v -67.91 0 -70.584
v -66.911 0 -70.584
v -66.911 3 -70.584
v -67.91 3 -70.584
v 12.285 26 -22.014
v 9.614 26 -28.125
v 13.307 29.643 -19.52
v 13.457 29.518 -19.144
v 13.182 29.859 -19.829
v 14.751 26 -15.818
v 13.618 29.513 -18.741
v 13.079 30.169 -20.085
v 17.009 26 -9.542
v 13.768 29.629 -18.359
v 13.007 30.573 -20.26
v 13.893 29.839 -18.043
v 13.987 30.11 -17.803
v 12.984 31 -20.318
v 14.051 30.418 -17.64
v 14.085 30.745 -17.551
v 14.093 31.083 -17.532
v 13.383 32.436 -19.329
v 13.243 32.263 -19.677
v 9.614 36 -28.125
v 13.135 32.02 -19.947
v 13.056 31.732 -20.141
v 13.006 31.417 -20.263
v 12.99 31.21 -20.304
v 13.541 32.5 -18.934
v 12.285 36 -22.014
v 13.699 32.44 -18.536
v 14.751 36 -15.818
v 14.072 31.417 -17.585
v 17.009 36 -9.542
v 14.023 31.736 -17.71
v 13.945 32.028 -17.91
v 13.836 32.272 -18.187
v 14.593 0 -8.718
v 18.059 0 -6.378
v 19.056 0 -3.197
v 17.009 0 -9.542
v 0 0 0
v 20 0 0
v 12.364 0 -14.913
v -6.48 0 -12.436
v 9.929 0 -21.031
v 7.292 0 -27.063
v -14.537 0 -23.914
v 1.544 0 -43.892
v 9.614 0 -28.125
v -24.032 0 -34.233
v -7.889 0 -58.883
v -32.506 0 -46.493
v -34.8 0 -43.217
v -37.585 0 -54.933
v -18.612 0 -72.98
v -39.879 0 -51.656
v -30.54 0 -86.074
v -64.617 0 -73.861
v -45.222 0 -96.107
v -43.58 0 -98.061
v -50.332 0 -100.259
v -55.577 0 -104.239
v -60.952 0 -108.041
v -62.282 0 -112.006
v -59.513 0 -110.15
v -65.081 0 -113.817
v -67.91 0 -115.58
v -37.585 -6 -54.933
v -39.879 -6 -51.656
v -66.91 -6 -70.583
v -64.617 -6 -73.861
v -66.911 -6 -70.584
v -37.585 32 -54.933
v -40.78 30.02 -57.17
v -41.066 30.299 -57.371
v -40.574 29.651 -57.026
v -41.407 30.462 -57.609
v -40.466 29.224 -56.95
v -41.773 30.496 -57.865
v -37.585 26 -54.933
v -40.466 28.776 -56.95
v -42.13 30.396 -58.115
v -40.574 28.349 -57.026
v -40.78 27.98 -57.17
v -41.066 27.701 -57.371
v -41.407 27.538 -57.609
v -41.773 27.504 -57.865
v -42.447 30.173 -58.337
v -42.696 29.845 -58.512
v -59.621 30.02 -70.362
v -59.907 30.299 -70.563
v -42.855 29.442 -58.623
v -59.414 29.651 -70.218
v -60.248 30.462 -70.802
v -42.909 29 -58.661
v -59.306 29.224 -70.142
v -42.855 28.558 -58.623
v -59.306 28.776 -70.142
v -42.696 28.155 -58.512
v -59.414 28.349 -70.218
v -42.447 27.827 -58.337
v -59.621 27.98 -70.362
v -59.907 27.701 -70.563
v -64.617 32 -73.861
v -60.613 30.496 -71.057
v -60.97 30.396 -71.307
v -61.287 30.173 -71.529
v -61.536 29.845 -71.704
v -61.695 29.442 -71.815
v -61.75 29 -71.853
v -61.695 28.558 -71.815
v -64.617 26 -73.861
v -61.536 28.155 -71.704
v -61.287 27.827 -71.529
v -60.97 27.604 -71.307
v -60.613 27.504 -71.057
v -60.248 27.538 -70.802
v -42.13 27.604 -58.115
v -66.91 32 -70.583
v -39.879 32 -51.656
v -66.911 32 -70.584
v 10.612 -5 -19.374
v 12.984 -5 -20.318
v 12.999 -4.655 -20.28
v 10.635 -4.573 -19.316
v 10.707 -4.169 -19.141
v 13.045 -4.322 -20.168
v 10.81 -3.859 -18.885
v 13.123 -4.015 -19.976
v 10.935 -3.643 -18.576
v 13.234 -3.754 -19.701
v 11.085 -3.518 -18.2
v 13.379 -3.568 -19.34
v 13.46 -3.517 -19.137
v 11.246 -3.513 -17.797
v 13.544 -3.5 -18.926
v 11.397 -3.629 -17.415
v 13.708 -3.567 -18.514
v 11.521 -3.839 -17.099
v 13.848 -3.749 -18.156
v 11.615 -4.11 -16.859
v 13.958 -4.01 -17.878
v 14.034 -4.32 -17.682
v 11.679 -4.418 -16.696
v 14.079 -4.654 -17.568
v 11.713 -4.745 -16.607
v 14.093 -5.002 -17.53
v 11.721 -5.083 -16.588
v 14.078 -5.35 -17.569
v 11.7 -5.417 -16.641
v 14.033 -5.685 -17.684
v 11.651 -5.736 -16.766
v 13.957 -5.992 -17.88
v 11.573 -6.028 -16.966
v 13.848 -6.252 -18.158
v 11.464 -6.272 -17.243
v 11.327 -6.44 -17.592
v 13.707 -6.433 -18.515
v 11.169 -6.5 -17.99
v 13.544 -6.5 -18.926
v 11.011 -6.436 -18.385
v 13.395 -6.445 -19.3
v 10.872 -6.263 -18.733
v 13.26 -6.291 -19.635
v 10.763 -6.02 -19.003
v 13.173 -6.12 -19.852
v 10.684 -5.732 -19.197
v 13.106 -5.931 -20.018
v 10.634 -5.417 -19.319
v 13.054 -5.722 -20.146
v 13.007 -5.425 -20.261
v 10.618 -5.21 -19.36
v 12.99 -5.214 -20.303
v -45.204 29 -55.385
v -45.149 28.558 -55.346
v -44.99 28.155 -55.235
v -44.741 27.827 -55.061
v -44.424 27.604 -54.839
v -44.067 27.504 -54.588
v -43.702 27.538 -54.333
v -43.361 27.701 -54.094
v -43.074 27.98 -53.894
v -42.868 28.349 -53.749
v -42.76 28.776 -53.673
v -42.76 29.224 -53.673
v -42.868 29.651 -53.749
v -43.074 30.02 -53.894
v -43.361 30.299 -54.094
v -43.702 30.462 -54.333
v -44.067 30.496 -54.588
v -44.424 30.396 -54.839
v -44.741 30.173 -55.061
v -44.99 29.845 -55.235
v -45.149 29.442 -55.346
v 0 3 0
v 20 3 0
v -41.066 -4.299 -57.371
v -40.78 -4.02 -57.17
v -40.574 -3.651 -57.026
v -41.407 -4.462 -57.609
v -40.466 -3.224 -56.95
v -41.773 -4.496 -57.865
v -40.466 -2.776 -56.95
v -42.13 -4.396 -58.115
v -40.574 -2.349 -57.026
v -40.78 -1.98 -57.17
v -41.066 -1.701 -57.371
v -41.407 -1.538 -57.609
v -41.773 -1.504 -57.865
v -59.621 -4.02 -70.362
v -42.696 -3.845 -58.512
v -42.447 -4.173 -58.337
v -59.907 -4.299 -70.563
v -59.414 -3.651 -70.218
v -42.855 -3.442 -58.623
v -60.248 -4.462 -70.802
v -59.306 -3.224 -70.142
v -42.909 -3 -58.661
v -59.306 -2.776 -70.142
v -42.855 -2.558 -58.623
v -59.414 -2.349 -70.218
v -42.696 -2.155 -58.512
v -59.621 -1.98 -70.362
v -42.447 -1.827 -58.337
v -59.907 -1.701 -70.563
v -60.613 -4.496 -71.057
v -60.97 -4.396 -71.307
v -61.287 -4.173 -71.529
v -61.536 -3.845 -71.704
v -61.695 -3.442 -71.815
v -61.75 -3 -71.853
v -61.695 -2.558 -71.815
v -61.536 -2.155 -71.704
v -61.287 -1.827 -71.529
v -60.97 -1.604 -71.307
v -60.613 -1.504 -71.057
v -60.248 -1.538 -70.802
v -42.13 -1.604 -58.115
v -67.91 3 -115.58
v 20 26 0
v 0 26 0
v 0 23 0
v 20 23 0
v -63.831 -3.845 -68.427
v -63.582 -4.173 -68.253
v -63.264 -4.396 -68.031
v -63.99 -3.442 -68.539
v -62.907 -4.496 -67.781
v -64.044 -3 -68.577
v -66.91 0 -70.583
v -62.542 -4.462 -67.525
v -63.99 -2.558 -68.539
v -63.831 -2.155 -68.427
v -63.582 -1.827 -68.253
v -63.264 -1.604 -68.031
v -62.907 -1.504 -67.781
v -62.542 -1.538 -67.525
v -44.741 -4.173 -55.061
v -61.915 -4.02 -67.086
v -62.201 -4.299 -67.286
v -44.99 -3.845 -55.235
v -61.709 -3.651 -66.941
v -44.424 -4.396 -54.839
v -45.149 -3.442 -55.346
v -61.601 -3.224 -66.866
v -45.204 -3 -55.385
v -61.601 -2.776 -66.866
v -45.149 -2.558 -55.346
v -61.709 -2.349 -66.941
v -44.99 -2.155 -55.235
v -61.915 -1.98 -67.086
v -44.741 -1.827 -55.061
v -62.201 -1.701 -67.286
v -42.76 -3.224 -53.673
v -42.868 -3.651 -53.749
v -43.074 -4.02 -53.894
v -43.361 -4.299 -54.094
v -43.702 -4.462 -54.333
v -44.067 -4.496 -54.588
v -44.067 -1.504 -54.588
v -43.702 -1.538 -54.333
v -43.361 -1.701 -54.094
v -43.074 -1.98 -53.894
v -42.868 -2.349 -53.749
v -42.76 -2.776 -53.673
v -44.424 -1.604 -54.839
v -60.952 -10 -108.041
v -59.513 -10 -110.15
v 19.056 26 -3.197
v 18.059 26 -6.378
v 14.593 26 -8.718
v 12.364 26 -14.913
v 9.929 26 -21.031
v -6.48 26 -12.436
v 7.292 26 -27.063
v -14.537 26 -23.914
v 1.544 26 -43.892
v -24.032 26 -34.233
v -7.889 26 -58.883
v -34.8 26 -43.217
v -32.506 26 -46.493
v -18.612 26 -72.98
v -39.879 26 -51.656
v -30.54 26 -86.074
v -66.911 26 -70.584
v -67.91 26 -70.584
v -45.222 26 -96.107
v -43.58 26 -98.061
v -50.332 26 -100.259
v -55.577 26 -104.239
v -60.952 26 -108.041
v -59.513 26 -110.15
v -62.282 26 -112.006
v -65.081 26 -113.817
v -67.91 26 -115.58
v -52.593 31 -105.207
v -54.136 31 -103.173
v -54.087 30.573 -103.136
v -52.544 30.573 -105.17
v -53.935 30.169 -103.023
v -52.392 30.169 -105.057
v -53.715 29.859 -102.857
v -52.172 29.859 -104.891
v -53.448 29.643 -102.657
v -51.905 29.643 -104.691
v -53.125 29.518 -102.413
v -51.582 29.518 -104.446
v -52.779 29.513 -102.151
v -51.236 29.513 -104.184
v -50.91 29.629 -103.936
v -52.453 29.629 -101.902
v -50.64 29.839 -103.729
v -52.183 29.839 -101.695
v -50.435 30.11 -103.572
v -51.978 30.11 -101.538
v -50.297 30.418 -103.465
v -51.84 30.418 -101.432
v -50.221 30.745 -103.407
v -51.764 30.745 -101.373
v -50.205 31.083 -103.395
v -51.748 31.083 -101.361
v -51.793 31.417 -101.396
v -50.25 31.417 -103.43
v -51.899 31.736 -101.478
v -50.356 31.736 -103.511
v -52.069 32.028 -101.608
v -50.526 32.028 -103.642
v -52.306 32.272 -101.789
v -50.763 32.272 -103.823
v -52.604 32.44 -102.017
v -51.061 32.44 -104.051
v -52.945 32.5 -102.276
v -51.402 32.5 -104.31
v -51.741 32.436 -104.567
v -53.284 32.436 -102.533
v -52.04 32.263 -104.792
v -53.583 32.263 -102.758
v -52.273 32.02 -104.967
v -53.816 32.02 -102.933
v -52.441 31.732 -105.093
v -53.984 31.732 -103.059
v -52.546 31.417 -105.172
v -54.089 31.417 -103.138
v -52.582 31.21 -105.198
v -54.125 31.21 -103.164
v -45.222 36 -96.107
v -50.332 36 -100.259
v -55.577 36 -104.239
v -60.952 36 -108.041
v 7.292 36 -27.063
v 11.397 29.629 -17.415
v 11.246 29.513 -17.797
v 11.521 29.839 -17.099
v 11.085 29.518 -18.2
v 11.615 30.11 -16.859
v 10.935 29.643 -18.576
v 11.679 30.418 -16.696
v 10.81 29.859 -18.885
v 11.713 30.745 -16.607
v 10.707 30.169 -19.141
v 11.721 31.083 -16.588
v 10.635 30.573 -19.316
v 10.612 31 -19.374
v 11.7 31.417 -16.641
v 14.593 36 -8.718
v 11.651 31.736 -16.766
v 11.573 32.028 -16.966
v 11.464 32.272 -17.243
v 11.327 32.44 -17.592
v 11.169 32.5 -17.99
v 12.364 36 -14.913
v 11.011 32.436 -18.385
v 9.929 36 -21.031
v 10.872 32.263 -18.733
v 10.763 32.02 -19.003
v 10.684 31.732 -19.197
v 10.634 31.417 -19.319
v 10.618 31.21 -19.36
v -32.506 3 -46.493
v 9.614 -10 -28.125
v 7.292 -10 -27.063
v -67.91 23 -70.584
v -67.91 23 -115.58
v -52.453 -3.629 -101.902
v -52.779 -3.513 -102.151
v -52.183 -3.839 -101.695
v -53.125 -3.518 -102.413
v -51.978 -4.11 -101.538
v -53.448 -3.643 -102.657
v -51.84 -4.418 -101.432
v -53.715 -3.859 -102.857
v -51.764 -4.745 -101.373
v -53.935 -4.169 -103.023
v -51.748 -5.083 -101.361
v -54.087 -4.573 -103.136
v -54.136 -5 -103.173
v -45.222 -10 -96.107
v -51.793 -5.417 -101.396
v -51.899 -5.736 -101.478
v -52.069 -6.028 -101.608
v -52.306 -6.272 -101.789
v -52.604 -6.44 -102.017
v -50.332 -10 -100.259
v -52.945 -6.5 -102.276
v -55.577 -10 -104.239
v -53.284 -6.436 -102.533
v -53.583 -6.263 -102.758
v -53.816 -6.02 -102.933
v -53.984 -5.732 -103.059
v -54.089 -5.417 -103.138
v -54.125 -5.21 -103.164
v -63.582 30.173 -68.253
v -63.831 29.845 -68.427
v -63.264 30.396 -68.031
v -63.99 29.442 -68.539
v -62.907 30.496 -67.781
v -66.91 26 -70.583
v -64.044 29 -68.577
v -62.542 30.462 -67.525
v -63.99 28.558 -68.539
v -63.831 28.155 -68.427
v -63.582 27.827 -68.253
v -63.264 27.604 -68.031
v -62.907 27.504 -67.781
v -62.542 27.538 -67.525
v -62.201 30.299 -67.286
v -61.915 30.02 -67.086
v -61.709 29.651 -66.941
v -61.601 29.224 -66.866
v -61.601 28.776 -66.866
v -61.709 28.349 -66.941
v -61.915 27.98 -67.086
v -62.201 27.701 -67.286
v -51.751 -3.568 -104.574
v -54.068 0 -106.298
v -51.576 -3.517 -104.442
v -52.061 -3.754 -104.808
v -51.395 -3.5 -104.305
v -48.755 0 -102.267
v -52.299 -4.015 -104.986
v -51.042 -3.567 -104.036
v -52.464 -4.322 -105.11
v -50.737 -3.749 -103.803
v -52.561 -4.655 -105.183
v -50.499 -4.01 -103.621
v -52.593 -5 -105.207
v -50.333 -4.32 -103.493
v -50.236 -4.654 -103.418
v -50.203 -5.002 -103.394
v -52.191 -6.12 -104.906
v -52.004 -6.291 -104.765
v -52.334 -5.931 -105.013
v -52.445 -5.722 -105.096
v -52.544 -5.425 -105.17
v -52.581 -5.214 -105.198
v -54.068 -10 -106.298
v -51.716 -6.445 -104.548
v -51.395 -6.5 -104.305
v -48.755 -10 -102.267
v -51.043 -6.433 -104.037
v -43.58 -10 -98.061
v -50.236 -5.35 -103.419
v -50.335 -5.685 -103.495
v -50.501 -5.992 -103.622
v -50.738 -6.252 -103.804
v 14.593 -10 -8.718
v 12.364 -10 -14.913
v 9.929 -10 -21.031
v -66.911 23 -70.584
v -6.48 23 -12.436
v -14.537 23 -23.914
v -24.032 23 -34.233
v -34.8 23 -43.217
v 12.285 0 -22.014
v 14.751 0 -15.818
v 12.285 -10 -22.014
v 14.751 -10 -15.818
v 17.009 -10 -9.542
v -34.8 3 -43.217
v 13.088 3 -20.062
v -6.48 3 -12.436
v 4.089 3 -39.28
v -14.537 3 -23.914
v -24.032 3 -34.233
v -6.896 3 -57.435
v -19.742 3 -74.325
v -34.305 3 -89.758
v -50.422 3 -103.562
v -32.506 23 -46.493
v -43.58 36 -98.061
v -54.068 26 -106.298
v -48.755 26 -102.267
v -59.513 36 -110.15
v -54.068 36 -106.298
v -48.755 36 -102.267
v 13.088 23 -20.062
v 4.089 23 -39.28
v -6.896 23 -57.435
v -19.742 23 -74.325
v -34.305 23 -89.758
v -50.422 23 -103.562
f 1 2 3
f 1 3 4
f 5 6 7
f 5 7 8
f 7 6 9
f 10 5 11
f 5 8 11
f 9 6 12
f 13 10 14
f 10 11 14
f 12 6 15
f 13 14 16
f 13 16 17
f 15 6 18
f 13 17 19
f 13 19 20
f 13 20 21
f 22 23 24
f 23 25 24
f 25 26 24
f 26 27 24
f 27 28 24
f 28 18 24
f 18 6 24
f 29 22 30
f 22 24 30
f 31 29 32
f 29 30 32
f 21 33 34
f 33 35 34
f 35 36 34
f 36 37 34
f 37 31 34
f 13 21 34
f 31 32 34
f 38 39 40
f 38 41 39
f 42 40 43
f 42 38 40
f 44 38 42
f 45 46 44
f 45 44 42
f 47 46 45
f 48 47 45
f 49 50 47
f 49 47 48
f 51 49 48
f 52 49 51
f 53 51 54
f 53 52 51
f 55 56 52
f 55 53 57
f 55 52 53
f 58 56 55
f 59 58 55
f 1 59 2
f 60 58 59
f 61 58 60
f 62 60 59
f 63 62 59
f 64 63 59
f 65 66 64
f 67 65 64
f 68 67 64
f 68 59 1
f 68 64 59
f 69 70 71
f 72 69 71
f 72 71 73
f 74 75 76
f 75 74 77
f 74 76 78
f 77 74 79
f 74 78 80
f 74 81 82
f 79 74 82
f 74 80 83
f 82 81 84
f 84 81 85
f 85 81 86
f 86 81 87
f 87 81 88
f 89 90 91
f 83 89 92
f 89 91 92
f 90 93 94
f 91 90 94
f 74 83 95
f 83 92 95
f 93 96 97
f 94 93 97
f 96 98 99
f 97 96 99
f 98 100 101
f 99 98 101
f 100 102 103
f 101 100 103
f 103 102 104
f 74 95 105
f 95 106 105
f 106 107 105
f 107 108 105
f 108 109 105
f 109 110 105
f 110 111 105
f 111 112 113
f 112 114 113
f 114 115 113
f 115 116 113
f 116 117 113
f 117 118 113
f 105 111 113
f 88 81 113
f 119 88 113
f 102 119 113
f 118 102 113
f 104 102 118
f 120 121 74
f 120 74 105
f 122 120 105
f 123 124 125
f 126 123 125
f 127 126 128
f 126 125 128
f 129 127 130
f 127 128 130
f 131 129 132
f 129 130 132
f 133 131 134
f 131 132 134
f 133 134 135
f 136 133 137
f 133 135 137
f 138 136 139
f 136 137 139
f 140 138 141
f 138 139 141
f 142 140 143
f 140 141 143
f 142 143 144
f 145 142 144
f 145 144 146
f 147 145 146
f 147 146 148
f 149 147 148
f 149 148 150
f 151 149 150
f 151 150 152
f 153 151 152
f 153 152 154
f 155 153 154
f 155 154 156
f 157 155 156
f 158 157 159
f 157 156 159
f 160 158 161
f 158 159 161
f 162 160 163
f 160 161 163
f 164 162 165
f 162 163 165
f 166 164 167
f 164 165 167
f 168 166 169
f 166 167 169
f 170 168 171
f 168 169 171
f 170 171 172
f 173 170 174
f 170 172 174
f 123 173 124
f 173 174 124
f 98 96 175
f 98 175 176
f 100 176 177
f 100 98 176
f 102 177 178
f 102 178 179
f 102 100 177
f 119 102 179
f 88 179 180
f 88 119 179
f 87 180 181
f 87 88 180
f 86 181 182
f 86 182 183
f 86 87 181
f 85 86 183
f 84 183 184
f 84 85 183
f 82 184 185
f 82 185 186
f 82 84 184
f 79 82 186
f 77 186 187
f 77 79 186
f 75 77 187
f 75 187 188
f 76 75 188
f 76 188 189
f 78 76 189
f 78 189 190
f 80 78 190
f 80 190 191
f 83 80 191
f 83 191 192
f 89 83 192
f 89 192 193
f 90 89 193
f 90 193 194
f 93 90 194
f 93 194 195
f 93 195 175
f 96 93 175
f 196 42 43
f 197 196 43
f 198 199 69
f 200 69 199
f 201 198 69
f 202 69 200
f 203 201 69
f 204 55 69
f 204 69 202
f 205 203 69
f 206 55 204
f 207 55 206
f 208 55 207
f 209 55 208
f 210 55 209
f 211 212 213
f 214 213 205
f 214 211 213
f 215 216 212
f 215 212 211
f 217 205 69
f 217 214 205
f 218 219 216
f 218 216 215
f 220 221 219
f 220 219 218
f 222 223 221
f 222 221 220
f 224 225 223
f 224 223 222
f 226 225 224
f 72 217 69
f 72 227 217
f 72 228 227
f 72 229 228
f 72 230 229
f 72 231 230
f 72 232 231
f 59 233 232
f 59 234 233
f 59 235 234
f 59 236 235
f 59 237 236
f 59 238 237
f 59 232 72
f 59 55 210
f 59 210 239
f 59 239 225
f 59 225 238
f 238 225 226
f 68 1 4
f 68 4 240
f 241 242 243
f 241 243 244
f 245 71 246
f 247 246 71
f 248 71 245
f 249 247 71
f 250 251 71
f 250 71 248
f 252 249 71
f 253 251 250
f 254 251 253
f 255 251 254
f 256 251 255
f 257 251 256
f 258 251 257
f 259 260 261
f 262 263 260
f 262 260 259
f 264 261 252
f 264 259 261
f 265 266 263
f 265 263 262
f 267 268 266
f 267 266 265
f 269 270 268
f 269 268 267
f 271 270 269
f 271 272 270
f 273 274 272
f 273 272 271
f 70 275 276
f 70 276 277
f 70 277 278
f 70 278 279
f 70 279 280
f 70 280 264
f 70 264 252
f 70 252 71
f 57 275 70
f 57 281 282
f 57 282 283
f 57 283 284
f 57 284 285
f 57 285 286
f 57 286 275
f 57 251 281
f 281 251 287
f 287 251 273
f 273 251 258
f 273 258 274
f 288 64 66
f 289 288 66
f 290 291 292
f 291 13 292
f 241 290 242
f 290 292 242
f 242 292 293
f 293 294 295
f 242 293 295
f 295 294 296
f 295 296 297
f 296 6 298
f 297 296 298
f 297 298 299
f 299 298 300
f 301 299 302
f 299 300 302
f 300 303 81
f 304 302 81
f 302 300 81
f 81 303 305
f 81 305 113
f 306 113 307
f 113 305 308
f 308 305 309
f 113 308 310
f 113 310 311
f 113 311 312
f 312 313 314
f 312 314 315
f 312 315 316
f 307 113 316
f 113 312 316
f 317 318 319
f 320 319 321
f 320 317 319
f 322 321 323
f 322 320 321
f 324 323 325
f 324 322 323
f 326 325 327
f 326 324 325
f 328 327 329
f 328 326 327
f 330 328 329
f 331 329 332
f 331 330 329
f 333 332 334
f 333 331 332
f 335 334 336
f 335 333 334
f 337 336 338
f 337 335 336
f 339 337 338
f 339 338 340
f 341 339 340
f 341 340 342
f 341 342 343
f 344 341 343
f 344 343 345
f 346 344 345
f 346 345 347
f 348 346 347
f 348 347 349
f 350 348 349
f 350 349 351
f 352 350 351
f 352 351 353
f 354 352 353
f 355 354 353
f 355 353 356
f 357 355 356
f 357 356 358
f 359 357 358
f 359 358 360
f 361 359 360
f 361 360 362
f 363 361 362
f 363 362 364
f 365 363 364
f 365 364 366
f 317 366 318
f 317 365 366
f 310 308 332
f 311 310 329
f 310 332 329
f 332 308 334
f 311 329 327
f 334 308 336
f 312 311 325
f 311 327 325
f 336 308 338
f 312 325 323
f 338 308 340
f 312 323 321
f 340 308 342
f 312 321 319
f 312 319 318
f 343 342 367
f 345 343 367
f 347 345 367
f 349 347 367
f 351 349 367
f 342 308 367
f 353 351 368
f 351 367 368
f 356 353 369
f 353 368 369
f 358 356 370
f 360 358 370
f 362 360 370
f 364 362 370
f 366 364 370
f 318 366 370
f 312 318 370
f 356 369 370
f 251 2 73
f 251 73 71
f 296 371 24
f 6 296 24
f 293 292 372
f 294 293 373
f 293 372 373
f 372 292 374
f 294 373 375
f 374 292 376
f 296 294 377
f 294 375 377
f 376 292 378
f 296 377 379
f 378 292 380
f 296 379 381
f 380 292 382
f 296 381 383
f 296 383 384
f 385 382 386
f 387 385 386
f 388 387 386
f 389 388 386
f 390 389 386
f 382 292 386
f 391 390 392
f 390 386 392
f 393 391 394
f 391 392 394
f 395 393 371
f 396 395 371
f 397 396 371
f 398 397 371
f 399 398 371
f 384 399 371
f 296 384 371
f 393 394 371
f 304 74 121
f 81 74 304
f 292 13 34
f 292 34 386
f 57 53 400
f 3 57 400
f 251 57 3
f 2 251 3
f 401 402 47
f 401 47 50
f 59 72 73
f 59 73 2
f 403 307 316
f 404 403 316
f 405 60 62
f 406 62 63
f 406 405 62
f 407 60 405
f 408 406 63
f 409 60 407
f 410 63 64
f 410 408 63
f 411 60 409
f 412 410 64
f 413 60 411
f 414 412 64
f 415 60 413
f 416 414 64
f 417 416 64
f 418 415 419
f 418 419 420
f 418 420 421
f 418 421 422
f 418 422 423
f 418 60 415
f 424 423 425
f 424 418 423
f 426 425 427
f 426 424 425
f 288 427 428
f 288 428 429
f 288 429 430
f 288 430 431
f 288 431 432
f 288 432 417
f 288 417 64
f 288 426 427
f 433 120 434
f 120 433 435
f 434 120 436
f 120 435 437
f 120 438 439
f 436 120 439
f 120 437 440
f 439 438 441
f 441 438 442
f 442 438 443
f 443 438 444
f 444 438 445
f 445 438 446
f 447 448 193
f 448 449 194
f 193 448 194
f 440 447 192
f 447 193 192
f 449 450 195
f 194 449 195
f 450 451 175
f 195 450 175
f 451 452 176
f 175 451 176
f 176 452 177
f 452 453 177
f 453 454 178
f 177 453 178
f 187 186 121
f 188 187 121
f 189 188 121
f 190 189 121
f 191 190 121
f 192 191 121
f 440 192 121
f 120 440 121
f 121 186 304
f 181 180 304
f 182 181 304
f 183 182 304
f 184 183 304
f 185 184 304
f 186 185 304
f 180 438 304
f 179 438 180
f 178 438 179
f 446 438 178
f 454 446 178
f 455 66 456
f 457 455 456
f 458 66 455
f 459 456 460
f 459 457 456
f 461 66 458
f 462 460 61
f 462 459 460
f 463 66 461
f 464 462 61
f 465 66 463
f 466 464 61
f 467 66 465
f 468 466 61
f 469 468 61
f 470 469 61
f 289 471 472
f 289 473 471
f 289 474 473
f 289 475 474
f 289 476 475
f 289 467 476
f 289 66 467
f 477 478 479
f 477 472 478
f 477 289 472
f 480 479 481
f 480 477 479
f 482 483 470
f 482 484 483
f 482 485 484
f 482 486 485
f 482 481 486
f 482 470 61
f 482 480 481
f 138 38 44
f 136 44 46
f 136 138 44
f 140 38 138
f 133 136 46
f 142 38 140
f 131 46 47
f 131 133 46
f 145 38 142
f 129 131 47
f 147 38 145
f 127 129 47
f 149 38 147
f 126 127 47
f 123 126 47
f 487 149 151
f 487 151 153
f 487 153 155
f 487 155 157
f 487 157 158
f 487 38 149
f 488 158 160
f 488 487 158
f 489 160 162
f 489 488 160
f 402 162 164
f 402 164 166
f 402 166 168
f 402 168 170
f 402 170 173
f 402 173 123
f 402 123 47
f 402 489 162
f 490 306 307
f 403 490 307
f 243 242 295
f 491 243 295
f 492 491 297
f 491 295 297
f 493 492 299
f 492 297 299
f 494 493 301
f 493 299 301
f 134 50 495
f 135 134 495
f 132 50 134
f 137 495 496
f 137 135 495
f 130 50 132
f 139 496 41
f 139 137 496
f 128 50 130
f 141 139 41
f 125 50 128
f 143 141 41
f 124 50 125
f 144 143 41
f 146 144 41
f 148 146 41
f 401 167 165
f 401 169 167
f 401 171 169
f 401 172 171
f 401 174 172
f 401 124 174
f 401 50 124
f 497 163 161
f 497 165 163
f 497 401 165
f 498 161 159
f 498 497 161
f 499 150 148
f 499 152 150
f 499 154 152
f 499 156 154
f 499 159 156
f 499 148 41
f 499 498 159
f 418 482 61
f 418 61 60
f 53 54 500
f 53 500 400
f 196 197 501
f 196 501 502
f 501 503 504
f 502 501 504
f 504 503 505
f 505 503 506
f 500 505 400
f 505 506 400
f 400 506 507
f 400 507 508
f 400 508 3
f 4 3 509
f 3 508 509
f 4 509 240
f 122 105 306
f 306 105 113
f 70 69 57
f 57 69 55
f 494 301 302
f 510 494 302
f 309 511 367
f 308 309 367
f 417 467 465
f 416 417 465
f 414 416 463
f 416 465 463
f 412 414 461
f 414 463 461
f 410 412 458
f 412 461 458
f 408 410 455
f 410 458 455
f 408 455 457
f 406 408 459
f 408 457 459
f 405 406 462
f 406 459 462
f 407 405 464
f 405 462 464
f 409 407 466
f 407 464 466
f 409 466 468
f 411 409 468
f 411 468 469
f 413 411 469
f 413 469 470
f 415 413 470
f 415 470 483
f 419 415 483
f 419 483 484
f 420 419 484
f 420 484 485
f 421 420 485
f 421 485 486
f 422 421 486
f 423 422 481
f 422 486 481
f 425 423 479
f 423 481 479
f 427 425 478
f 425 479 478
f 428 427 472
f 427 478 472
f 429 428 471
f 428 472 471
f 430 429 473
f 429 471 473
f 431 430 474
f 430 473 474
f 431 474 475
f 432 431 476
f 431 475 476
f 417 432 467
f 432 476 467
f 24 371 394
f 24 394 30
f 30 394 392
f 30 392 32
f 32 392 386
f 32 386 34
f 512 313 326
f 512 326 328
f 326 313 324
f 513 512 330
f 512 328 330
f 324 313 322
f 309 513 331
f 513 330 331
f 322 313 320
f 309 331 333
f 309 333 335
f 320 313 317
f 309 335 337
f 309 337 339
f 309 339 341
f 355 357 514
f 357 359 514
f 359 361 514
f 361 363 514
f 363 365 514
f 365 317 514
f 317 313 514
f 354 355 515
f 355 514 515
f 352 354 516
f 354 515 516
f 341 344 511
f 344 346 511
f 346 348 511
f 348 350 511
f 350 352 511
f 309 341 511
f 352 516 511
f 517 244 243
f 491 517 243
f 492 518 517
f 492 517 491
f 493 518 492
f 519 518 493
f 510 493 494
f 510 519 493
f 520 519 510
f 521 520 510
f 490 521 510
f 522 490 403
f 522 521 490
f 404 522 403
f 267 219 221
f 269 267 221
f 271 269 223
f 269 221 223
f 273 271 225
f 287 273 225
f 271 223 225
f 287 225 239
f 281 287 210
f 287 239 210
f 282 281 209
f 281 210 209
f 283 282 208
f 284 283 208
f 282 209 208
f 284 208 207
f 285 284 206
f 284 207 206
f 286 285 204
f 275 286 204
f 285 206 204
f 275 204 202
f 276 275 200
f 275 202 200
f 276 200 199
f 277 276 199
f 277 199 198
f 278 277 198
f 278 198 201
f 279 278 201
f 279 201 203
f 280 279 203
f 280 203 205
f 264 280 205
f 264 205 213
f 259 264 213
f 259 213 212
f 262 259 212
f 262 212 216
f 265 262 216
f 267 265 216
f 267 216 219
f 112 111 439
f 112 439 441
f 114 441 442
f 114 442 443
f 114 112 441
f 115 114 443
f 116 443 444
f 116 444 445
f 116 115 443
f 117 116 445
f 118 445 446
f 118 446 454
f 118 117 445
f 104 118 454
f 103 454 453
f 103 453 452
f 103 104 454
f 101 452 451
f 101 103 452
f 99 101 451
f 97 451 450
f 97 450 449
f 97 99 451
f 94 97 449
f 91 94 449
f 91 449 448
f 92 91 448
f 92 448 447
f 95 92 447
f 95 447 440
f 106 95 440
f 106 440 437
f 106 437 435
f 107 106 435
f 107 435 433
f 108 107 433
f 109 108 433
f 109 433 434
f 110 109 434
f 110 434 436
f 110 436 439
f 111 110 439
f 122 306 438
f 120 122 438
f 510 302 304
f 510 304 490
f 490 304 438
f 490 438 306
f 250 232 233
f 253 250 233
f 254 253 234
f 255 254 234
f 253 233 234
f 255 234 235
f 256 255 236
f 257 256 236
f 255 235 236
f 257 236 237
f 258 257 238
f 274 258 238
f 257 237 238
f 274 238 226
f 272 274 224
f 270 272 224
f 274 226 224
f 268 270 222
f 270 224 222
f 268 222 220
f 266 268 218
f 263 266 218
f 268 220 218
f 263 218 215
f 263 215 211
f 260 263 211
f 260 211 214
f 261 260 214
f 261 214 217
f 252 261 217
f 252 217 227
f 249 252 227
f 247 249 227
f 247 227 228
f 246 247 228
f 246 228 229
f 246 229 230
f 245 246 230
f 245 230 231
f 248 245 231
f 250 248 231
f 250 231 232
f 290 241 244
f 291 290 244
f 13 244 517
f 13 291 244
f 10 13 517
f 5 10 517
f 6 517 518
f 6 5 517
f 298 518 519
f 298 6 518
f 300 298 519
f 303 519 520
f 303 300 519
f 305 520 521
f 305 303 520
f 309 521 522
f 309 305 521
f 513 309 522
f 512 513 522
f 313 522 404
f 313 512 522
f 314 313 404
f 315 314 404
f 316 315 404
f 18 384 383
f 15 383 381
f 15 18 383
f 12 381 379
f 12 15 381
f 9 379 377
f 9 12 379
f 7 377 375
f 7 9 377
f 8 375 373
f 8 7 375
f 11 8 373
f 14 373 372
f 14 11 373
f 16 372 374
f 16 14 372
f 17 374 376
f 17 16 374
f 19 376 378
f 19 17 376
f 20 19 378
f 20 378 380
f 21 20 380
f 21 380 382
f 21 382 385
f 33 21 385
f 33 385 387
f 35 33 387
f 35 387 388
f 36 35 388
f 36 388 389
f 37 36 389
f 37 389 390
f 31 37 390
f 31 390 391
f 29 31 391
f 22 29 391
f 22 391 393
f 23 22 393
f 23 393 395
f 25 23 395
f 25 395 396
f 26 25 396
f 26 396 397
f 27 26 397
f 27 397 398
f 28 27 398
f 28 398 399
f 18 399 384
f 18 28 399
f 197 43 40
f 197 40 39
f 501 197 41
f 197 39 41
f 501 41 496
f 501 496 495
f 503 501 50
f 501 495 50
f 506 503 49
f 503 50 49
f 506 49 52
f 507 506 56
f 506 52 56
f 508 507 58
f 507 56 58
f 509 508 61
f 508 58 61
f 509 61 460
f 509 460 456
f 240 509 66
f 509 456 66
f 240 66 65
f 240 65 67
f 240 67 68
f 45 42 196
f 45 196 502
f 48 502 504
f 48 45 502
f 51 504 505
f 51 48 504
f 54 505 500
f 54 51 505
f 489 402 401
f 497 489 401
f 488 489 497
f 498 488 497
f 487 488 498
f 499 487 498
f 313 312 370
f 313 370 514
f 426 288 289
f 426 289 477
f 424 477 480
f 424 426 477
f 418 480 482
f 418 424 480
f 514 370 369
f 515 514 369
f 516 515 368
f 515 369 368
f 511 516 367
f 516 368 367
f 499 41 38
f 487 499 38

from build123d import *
from build123d.topology import SkipClean

# Parameters (mm, degrees)
BOSS_EXTRUDE1_DEPTH = 3
BOSS_EXTRUDE2_DEPTH = 6
SKETCH3_R           = 1.5
SKETCH3_W           = 9.001604742
SKETCH3_H           = 6
SKETCH3_W_2         = 4.02
CUT_EXTRUDE1_DEPTH  = 127.267442601
BOSS_EXTRUDE3_DEPTH = 3
BOSS_EXTRUDE4_START = 10
BOSS_EXTRUDE4_DEPTH = 10
SKETCH8_R           = 1.5
CUT_EXTRUDE2_DEPTH  = 128.065880874
SKETCH9_R           = 1.5
CUT_EXTRUDE3_DEPTH  = 139.749200001


with BuildPart() as part:
    # Sketch1 → Boss-Extrude1 (new body)
    with BuildSketch(Plane(origin=(0, 0, 0), x_dir=(1, 0, 0), z_dir=(0, 1, 0))):
        with BuildLine():
            Line((0, 0), (20, 0))
            ThreePointArc((20, 0), (-13.094687741, 66.050339598), (-67.91, 115.58))
            Line((-67.91, 115.58), (-67.91, 72.58))
            ThreePointArc((-67.91, 72.58), (-27.76846685, 42.078474321), (0, 0))
        make_face()
    extrude(amount=BOSS_EXTRUDE1_DEPTH)

    # Sketch2 → Boss-Extrude2 (add)
    with BuildSketch(Plane.XZ):
        Polygon((-66.91, -70.583412503), (-32.50561414, -46.493202176), (-32.50561414, -51.376300531), (-67.91, -76.166718396), (-67.91, -71.283620041), align=None)
    extrude(amount=BOSS_EXTRUDE2_DEPTH)

    # Sketch3 → Cut-Extrude1 (cut, through all)
    with BuildSketch(Plane(origin=(13.44494558, 0, -19.201372231), x_dir=(-0.8191520442889929, 0, -0.5735764363510446), z_dir=(0.5735764363510446, 0, -0.819152044288993))):
        with Locations((90.296050234, -3)):
            Circle(SKETCH3_R)
        with Locations((67.296050234, -3)):
            Circle(SKETCH3_R)
        with Locations((57.795247863, -3)):
            Rectangle(SKETCH3_W, SKETCH3_H)
        with Locations((97.306050234, -3)):
            Rectangle(SKETCH3_W_2, SKETCH3_H)
    extrude(amount=-CUT_EXTRUDE1_DEPTH, mode=Mode.SUBTRACT)

    # Sketch5 → Boss-Extrude3 (add)
    with BuildSketch(Plane(origin=(0, 0, 0), x_dir=(1, 0, 0), z_dir=(0, 1, 0))):
        with BuildLine():
            Line((-66.911314527, 70.584332945), (-67.91, 70.584332945))
            Line((-67.91, 70.584332945), (-67.91, 72.58))
            ThreePointArc((-67.91, 72.58), (-27.76846685, 42.078474321), (0, 0))
            ThreePointArc((0, 0), (-14.53687211, 23.913782415), (-34.799919885, 43.216593999))
            Line((-34.799919885, 43.216593999), (-32.50561414, 46.493202176))
            Line((-32.50561414, 46.493202176), (-66.911314527, 70.584332945))
        make_face()
    extrude(amount=BOSS_EXTRUDE3_DEPTH)

    # Sketch6 → Boss-Extrude4 (add)
    with SkipClean():  # the faces are left unmerged after this step: merging them gives an invalid solid
        with BuildSketch(Plane.XZ.offset(BOSS_EXTRUDE4_START)):
            with BuildLine():
                Line((17.009172499, -9.542271787), (14.592981256, -8.718082865))
                ThreePointArc((14.592981256, -8.718082865), (11.17200228, -17.982061111), (7.292103292, -27.06340319))
                Line((7.292103292, -27.06340319), (9.613897775, -28.124788079))
                ThreePointArc((9.613897775, -28.124788079), (13.543961948, -18.926028715), (17.009172499, -9.542271787))
            make_face()
            with BuildLine():
                Line((-43.579643128, -98.061194149), (-45.222450268, -96.107108121))
                ThreePointArc((-45.222450268, -96.107108121), (-52.938064428, -102.271010152), (-60.952223136, -108.041421776))
                Line((-60.952223136, -108.041421776), (-59.512794221, -110.149812608))
                ThreePointArc((-59.512794221, -110.149812608), (-51.395016384, -104.304792401), (-43.579643128, -98.061194149))
            make_face()
        extrude(amount=-BOSS_EXTRUDE4_DEPTH)

    # Sketch8 → Cut-Extrude2 (cut, through all)
    with SkipClean():  # the faces are left unmerged after this step: merging them gives an invalid solid
        with BuildSketch(Plane(origin=(-51.395016384, -10, -104.304792401), x_dir=(-0.7966575546498905, 0, -0.6044309229508835), z_dir=(0.6044309229508835, 0, -0.7966575546498905))):
            with Locations((0, 5)):
                Circle(SKETCH8_R)
        extrude(amount=-CUT_EXTRUDE2_DEPTH, mode=Mode.SUBTRACT)

    # Sketch9 → Cut-Extrude3 (cut, through all)
    with SkipClean():  # the faces are left unmerged after this step: merging them gives an invalid solid
        with BuildSketch(Plane(origin=(18.194331028, 0, -7.240788829), x_dir=(-0.3697637362221705, 0, -0.9291258146101751), z_dir=(0.9291258146101751, 0, -0.3697637362221705))):
            with Locations((12.576595874, -5)):
                Circle(SKETCH9_R)
        extrude(amount=-CUT_EXTRUDE3_DEPTH, mode=Mode.SUBTRACT)


with BuildPart() as body_2:
    # Mirror2: mirrored copy
    add(part.part.mirror(Plane.ZX.offset(13)))


solid = Compound([part.part, body_2.part])
